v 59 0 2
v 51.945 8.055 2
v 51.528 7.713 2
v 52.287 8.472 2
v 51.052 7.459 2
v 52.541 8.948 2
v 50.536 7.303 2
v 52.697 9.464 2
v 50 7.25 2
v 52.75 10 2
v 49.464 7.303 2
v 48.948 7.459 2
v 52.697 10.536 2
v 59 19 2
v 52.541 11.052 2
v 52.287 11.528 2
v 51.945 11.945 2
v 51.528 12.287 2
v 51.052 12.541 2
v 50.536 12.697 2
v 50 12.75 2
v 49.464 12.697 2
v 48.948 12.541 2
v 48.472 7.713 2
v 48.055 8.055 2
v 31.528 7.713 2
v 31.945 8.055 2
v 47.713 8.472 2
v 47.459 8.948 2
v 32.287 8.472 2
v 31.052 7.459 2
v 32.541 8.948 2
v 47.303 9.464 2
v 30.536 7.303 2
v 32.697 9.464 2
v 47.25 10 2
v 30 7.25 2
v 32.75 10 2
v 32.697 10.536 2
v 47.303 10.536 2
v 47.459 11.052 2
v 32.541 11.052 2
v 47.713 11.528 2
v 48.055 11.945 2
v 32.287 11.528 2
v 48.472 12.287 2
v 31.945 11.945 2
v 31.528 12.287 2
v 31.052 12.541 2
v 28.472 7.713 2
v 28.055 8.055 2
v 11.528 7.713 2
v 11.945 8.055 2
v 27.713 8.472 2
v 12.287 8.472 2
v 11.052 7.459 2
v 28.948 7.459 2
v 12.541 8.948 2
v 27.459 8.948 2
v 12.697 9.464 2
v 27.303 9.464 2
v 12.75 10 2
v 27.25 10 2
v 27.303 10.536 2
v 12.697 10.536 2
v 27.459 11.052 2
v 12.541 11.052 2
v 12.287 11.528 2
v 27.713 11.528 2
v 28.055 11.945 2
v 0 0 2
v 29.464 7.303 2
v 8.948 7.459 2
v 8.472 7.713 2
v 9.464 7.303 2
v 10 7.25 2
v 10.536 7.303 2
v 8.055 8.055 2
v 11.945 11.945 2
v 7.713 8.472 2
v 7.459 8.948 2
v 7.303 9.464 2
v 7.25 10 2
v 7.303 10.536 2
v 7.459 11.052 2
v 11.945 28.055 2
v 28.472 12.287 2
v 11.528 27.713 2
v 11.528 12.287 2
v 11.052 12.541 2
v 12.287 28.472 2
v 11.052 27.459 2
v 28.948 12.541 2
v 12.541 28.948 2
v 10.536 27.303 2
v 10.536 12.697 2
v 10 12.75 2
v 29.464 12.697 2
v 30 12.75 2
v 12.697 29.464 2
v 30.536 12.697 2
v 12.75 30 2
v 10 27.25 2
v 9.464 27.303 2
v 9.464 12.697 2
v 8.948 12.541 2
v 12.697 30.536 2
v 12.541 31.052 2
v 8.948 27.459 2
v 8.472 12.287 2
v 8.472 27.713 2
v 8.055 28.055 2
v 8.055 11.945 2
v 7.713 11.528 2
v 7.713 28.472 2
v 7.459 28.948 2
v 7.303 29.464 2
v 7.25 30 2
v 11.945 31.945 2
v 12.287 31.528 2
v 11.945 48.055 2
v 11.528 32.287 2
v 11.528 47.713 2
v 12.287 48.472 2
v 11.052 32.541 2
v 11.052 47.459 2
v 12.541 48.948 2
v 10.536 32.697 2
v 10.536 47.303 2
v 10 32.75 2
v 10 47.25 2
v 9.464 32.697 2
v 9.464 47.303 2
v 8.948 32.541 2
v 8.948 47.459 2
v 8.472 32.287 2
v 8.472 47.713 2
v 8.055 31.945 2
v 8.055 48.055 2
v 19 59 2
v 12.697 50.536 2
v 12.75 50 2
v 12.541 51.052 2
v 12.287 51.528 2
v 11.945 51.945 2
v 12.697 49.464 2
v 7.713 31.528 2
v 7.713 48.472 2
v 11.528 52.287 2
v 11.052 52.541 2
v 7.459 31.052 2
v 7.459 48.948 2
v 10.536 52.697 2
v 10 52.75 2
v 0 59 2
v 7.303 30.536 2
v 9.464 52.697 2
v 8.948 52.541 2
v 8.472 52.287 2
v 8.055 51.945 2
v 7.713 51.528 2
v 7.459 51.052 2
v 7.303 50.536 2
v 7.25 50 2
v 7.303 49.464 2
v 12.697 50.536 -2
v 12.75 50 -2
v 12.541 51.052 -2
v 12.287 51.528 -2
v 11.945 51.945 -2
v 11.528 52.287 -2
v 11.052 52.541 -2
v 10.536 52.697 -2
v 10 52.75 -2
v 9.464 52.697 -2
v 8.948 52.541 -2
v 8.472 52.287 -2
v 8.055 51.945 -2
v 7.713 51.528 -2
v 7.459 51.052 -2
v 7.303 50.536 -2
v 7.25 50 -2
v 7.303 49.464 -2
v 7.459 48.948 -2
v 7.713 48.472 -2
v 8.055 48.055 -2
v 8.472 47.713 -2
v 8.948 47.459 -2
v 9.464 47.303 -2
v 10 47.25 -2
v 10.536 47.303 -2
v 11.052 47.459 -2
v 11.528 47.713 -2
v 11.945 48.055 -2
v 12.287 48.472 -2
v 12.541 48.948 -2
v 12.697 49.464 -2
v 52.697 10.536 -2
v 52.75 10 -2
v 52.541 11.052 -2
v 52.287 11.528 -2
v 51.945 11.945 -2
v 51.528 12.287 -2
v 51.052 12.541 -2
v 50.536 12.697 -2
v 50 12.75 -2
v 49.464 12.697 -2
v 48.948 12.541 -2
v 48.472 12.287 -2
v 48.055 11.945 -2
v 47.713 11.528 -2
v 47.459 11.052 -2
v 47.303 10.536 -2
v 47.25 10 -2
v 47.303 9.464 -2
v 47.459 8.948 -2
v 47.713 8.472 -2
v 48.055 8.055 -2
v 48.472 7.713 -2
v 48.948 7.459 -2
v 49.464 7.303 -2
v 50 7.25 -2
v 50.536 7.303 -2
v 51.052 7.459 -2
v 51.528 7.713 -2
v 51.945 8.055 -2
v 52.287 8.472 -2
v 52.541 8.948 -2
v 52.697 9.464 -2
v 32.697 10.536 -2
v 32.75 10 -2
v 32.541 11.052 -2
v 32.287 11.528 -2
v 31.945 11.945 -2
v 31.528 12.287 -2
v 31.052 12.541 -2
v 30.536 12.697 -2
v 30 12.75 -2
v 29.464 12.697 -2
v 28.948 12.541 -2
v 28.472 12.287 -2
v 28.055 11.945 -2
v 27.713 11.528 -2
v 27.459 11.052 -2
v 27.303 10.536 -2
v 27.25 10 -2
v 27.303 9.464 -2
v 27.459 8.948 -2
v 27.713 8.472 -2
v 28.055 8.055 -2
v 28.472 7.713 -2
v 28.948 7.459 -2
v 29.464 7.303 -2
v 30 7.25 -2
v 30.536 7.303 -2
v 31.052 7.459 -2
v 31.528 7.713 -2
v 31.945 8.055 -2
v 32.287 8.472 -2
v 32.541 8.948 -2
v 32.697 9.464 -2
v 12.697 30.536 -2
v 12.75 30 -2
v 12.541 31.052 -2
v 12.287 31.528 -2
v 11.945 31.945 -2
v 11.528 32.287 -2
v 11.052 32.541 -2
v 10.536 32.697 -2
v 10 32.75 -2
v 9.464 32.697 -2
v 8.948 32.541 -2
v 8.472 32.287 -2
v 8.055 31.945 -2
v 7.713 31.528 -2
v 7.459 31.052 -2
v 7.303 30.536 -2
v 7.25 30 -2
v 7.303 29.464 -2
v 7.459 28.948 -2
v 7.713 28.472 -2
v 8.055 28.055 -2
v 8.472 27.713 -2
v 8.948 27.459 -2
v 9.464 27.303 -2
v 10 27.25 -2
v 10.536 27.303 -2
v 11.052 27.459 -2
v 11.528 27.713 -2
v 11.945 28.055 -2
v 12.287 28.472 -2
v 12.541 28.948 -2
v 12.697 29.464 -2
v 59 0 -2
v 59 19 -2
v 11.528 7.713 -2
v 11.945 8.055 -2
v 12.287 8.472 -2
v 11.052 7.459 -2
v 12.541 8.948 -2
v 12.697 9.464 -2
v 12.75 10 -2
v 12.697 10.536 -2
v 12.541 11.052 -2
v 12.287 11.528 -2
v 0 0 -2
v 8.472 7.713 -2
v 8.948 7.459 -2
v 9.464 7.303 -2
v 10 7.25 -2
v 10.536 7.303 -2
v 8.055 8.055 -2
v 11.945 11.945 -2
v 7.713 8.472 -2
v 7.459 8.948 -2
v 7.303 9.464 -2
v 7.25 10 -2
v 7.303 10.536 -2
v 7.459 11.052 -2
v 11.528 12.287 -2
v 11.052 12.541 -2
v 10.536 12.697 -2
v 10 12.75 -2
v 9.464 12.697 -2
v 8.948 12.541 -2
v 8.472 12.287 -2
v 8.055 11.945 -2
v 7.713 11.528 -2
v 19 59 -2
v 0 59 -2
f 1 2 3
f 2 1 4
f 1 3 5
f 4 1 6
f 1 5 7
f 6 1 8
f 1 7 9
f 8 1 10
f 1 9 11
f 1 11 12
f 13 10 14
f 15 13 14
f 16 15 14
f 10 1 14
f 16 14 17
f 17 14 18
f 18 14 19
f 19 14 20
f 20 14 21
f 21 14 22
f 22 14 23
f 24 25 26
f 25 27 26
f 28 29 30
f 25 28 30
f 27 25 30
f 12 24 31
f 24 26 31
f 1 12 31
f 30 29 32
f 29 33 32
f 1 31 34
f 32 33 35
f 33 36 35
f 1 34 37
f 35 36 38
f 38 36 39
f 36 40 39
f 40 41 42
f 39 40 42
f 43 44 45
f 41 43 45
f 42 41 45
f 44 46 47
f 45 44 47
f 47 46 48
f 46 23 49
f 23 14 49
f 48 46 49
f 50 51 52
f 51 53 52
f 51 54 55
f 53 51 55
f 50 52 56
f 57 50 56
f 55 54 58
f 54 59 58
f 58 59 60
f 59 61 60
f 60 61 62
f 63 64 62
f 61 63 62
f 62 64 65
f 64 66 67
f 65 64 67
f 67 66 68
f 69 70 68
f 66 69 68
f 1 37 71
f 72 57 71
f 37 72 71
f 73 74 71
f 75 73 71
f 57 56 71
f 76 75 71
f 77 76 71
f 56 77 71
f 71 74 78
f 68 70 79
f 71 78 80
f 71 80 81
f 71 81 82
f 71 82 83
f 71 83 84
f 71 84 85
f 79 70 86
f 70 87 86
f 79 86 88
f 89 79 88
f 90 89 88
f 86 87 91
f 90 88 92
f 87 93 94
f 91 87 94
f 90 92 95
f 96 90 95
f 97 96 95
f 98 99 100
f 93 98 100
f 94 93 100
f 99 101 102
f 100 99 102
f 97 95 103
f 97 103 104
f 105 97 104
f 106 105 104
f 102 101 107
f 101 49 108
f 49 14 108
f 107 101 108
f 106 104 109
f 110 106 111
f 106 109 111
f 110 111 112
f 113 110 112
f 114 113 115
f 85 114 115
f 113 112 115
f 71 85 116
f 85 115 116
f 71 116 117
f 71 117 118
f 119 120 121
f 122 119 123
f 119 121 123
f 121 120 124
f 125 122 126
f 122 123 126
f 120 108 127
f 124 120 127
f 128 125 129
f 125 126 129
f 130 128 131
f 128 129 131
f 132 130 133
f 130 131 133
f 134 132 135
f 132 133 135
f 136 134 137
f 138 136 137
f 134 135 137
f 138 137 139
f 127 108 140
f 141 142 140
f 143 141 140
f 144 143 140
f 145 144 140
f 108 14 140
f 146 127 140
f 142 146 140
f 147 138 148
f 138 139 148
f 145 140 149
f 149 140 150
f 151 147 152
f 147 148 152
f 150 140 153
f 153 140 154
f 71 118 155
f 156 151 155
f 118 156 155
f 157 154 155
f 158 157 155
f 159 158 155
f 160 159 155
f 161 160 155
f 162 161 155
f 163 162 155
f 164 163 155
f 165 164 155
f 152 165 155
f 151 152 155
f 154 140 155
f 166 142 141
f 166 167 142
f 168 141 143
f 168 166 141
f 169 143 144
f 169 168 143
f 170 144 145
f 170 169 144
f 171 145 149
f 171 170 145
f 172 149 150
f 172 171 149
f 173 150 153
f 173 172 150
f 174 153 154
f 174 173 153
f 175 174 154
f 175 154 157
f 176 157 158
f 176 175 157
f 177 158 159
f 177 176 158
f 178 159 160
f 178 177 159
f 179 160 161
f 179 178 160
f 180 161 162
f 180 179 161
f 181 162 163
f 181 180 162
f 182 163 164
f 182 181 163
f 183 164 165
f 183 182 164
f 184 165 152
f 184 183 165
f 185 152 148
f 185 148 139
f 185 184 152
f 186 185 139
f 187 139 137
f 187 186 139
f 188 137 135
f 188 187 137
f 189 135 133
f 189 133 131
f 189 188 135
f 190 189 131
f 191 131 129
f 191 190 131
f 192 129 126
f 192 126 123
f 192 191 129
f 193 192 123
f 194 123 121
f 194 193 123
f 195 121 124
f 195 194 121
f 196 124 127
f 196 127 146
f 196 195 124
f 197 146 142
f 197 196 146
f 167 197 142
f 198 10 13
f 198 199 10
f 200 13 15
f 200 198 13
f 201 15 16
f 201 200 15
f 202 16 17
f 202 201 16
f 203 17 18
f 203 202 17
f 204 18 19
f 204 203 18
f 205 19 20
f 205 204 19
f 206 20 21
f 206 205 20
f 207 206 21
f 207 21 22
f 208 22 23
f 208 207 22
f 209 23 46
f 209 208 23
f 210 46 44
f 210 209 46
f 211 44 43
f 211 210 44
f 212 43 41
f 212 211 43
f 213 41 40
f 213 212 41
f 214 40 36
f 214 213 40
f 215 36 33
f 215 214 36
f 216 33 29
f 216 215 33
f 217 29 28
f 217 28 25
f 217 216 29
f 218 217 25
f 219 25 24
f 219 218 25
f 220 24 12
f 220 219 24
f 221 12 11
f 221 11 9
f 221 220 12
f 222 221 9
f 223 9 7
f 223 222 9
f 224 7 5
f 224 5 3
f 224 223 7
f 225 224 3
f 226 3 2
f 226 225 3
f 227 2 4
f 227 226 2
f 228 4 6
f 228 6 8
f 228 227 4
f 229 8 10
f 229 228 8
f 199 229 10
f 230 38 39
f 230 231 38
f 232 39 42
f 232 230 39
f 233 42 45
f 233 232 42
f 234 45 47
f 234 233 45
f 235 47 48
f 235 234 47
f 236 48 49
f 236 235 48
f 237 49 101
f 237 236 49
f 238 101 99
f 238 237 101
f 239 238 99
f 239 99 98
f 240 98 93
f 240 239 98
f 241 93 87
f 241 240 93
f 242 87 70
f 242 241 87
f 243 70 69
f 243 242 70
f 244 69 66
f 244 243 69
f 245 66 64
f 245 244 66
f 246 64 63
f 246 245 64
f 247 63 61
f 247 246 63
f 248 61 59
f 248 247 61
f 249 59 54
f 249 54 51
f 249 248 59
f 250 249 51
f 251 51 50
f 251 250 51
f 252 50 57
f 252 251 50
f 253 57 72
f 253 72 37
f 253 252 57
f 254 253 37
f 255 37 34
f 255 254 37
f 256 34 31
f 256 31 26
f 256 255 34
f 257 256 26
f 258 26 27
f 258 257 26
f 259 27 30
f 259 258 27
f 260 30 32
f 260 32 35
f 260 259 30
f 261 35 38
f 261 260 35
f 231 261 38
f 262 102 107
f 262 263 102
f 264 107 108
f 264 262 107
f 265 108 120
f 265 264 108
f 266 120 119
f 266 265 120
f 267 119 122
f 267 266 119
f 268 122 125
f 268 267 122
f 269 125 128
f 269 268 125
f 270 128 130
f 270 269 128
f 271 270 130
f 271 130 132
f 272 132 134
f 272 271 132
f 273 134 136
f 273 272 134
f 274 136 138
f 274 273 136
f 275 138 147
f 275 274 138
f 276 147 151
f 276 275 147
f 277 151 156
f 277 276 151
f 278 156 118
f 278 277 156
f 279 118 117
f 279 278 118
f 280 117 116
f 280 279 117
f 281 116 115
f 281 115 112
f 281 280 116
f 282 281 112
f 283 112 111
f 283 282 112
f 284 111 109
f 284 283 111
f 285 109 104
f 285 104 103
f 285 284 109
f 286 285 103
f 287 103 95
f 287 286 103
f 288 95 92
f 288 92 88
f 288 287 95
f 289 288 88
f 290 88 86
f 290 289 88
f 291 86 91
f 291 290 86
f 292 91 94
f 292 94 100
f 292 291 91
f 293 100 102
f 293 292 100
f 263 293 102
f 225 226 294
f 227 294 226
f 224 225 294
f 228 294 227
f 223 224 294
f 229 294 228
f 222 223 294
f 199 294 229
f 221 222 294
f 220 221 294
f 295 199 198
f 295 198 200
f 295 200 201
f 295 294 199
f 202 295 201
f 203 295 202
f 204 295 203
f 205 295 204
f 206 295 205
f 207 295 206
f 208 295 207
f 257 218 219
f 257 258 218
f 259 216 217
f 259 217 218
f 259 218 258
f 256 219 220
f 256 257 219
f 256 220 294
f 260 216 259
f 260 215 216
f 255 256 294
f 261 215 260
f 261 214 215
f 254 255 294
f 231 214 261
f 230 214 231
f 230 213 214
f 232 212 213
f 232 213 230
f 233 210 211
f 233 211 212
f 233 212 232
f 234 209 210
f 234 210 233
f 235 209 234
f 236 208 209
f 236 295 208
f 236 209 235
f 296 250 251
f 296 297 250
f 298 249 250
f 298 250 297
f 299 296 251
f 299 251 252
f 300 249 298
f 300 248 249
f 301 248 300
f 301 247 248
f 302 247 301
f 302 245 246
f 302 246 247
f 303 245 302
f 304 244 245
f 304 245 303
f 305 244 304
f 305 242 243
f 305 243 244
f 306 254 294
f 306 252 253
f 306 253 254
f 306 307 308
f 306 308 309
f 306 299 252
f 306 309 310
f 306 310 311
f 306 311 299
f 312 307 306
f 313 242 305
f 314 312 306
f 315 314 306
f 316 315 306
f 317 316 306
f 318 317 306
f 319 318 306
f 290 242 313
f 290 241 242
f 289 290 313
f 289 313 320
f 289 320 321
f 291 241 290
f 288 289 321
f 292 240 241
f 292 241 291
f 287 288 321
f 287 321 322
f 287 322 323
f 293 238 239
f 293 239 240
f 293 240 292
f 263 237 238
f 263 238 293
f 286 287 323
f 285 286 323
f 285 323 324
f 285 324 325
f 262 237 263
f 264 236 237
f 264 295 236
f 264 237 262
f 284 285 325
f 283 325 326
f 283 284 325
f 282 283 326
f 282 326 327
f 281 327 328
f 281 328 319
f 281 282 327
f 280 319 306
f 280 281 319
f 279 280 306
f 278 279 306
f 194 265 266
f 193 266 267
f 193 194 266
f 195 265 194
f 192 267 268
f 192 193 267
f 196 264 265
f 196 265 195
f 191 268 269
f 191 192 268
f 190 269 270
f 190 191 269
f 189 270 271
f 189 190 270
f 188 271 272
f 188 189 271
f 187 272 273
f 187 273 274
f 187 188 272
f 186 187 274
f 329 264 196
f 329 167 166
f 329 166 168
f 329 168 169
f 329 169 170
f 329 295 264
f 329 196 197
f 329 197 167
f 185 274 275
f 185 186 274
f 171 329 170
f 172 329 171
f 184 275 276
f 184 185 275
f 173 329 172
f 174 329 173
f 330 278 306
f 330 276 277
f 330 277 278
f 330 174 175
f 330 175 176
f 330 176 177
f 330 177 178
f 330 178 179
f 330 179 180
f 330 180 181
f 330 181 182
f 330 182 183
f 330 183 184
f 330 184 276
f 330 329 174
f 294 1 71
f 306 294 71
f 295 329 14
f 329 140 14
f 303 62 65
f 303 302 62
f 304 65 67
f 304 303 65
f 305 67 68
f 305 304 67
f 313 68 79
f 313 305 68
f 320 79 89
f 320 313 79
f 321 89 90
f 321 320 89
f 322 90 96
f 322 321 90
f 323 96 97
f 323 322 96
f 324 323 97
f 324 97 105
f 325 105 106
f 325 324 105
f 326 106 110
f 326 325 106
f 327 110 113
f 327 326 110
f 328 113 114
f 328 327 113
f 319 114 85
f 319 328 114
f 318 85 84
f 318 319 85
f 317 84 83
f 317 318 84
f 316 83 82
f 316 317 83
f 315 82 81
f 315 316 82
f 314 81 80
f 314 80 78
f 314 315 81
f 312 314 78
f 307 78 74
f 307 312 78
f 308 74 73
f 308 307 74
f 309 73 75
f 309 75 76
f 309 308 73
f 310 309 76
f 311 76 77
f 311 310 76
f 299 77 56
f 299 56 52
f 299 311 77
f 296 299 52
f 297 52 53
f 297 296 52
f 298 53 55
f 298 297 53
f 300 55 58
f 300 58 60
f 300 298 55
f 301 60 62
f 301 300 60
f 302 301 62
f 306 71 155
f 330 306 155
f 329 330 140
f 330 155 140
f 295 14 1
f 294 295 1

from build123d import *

# Parameters (mm, degrees)
SKETCH1_R           = 2.75
BOSS_EXTRUDE1_DEPTH = 2


with BuildPart() as part:
    # Sketch1 → Boss-Extrude1 (new body, symmetric)
    with BuildSketch(Plane.XY):
        Polygon((0, 0), (0, 59), (19, 59), (59, 19), (59, 0), align=None)
        with Locations((10, 10)):
            Circle(SKETCH1_R, mode=Mode.SUBTRACT)
        with Locations((10, 30)):
            Circle(SKETCH1_R, mode=Mode.SUBTRACT)
        with Locations((10, 50)):
            Circle(SKETCH1_R, mode=Mode.SUBTRACT)
        with Locations((30, 10)):
            Circle(SKETCH1_R, mode=Mode.SUBTRACT)
        with Locations((50, 10)):
            Circle(SKETCH1_R, mode=Mode.SUBTRACT)
    extrude(amount=BOSS_EXTRUDE1_DEPTH, both=True)


solid = part.part
